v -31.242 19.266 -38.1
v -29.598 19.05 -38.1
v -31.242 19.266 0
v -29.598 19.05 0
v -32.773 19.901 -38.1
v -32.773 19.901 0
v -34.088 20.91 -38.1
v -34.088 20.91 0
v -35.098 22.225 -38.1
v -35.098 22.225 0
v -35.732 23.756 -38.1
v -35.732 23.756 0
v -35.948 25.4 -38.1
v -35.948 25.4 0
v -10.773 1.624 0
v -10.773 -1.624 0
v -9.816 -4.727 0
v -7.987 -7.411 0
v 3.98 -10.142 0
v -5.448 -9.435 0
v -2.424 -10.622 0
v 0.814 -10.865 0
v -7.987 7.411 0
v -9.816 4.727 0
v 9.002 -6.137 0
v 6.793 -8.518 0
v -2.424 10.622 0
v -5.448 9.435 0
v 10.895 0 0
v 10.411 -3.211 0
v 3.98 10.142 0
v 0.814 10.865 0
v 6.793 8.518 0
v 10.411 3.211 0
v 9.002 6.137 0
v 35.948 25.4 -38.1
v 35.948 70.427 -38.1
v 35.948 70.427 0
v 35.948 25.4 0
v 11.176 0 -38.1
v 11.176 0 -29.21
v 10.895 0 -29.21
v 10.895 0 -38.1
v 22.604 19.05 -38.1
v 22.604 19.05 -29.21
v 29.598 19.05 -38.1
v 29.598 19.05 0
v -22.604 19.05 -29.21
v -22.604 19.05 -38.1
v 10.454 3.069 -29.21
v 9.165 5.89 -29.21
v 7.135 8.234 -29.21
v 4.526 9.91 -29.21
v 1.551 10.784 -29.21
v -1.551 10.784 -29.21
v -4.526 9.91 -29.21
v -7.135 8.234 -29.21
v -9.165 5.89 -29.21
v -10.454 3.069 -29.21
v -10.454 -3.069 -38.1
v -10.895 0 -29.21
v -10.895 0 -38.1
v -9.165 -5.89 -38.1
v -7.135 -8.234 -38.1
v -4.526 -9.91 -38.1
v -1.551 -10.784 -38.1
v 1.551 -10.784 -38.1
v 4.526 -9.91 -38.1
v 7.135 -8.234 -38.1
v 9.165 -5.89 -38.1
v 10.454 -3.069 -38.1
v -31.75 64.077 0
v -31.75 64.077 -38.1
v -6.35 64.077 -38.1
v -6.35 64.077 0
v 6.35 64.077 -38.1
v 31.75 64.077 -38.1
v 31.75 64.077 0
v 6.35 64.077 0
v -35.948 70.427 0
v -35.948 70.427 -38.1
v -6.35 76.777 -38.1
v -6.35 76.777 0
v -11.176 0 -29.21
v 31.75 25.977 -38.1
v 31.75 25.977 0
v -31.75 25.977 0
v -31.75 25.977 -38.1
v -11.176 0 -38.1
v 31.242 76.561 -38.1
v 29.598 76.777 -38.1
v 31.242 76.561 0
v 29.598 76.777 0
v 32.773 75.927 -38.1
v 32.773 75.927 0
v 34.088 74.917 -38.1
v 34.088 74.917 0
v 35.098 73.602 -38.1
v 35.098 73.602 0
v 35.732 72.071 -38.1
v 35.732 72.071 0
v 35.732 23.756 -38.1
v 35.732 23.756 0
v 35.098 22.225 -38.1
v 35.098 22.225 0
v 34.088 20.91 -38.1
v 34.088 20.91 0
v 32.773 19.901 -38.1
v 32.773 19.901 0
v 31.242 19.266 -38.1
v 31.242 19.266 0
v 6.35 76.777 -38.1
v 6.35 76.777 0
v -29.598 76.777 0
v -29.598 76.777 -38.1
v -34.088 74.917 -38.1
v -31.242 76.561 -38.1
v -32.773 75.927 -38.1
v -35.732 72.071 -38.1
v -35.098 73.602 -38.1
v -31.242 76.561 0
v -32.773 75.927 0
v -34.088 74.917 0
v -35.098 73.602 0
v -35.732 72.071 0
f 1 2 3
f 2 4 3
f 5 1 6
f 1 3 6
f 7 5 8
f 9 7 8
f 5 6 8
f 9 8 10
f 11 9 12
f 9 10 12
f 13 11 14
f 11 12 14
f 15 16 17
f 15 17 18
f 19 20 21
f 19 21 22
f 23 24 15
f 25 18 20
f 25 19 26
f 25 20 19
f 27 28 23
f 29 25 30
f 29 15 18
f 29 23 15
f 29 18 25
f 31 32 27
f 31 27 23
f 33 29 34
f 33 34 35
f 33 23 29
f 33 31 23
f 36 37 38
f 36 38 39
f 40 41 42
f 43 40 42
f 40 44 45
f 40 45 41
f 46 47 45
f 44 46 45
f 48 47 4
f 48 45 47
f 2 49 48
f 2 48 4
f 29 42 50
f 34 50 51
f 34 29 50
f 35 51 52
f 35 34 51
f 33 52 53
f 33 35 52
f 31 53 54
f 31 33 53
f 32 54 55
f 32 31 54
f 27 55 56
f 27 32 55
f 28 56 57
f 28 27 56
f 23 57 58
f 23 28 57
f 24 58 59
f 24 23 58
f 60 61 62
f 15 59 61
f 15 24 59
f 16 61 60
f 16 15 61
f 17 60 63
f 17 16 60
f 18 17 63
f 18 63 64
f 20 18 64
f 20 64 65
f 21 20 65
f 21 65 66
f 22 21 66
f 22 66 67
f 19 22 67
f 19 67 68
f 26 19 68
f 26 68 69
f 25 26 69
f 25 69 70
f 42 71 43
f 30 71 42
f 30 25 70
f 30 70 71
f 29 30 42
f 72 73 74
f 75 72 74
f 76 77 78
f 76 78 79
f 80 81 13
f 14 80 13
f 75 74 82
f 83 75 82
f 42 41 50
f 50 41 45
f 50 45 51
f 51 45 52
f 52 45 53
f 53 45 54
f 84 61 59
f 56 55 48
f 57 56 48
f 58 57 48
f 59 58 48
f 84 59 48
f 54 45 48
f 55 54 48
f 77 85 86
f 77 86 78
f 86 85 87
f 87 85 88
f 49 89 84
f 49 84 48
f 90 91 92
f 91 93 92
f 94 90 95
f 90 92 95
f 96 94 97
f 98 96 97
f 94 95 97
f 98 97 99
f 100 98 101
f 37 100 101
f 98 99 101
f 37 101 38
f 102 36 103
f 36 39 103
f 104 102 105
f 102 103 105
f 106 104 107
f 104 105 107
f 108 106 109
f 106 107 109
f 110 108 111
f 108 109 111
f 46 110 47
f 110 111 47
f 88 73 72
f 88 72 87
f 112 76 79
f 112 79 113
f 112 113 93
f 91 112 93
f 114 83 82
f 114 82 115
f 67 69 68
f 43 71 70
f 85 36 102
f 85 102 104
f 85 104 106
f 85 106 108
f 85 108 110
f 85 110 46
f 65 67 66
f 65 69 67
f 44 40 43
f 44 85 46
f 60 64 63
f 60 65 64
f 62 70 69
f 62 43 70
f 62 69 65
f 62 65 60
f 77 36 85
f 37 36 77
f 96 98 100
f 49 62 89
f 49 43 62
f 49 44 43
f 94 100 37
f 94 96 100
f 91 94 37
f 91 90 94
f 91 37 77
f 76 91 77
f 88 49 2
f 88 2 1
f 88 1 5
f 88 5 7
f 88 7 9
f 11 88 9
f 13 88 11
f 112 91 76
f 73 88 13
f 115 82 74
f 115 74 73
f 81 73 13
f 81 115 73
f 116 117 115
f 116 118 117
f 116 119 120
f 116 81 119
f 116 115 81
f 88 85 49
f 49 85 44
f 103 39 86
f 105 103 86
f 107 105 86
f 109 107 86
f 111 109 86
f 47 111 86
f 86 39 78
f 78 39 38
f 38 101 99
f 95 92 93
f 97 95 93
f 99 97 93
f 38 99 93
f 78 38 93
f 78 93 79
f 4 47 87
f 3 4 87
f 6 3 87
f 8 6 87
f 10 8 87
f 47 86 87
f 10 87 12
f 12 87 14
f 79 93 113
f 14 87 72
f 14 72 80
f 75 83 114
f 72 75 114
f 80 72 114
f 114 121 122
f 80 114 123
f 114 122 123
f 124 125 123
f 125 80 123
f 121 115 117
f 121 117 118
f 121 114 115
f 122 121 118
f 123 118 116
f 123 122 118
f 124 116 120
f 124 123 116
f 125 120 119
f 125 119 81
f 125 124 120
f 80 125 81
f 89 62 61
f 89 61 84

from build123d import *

# Parameters (mm, degrees)
SKETCH1_R           = 10.89504564
BOSS_EXTRUDE1_DEPTH = 38.1
BOSS_EXTRUDE2_DEPTH = 8.89
SKETCH3_W           = 63.5
SKETCH3_H           = 6.927272727
BOSS_EXTRUDE3_DEPTH = 38.1
BOSS_EXTRUDE4_DEPTH = 38.1
FILLET1_R           = 6.35


with BuildPart() as part:
    # Sketch1 → Boss-Extrude1 (new body)
    with BuildSketch(Plane.XY):
        Circle(SKETCH1_R)
    extrude(amount=-BOSS_EXTRUDE1_DEPTH)

    # Sketch2 → Boss-Extrude2 (add)
    with BuildSketch(Plane(origin=(0, 0, -38.1), x_dir=(-1, 0, 0), z_dir=(0, 0, -1))):
        Polygon((-11.176, 0), (11.176, 0), (22.604396494, 19.05), (11.176, 19.05), (-11.176, 19.05), (-22.604396494, 19.05), align=None)
    extrude(amount=-BOSS_EXTRUDE2_DEPTH)

    # Sketch3 → Boss-Extrude3 (add)
    with BuildSketch(Plane(origin=(0, 0, -38.1), x_dir=(-1, 0, 0), z_dir=(0, 0, -1))):
        with Locations((0, 22.513636364)):
            Rectangle(SKETCH3_W, SKETCH3_H)
    extrude(amount=-BOSS_EXTRUDE3_DEPTH)

    # Sketch4 → Boss-Extrude4 (add)
    with BuildSketch(Plane(origin=(0, 0, -38.1), x_dir=(-1, 0, 0), z_dir=(0, 0, -1))):
        Polygon((-31.75, 25.977272727), (-31.75, 64.077272727), (-6.35, 64.077272727), (-6.35, 76.777272727), (-35.948347107, 76.777272727), (-35.948347107, 19.05), (-31.75, 19.05), align=None)
        Polygon((31.75, 25.977272727), (31.75, 64.077272727), (6.35, 64.077272727), (6.35, 76.777272727), (35.948347107, 76.777272727), (35.948347107, 19.05), (31.75, 19.05), align=None)
    extrude(amount=-BOSS_EXTRUDE4_DEPTH)

    # Fillet1
    fillet1_edges = [part.edges().sort_by_distance(p)[0] for p in [
        (35.948347107, 19.05, -19.05),
        (35.948347107, 76.777272727, -19.05),
        (-35.948347107, 76.777272727, -19.05),
        (-35.948347107, 19.05, -19.05),
    ]]
    fillet(fillet1_edges, radius=FILLET1_R)


solid = part.part
